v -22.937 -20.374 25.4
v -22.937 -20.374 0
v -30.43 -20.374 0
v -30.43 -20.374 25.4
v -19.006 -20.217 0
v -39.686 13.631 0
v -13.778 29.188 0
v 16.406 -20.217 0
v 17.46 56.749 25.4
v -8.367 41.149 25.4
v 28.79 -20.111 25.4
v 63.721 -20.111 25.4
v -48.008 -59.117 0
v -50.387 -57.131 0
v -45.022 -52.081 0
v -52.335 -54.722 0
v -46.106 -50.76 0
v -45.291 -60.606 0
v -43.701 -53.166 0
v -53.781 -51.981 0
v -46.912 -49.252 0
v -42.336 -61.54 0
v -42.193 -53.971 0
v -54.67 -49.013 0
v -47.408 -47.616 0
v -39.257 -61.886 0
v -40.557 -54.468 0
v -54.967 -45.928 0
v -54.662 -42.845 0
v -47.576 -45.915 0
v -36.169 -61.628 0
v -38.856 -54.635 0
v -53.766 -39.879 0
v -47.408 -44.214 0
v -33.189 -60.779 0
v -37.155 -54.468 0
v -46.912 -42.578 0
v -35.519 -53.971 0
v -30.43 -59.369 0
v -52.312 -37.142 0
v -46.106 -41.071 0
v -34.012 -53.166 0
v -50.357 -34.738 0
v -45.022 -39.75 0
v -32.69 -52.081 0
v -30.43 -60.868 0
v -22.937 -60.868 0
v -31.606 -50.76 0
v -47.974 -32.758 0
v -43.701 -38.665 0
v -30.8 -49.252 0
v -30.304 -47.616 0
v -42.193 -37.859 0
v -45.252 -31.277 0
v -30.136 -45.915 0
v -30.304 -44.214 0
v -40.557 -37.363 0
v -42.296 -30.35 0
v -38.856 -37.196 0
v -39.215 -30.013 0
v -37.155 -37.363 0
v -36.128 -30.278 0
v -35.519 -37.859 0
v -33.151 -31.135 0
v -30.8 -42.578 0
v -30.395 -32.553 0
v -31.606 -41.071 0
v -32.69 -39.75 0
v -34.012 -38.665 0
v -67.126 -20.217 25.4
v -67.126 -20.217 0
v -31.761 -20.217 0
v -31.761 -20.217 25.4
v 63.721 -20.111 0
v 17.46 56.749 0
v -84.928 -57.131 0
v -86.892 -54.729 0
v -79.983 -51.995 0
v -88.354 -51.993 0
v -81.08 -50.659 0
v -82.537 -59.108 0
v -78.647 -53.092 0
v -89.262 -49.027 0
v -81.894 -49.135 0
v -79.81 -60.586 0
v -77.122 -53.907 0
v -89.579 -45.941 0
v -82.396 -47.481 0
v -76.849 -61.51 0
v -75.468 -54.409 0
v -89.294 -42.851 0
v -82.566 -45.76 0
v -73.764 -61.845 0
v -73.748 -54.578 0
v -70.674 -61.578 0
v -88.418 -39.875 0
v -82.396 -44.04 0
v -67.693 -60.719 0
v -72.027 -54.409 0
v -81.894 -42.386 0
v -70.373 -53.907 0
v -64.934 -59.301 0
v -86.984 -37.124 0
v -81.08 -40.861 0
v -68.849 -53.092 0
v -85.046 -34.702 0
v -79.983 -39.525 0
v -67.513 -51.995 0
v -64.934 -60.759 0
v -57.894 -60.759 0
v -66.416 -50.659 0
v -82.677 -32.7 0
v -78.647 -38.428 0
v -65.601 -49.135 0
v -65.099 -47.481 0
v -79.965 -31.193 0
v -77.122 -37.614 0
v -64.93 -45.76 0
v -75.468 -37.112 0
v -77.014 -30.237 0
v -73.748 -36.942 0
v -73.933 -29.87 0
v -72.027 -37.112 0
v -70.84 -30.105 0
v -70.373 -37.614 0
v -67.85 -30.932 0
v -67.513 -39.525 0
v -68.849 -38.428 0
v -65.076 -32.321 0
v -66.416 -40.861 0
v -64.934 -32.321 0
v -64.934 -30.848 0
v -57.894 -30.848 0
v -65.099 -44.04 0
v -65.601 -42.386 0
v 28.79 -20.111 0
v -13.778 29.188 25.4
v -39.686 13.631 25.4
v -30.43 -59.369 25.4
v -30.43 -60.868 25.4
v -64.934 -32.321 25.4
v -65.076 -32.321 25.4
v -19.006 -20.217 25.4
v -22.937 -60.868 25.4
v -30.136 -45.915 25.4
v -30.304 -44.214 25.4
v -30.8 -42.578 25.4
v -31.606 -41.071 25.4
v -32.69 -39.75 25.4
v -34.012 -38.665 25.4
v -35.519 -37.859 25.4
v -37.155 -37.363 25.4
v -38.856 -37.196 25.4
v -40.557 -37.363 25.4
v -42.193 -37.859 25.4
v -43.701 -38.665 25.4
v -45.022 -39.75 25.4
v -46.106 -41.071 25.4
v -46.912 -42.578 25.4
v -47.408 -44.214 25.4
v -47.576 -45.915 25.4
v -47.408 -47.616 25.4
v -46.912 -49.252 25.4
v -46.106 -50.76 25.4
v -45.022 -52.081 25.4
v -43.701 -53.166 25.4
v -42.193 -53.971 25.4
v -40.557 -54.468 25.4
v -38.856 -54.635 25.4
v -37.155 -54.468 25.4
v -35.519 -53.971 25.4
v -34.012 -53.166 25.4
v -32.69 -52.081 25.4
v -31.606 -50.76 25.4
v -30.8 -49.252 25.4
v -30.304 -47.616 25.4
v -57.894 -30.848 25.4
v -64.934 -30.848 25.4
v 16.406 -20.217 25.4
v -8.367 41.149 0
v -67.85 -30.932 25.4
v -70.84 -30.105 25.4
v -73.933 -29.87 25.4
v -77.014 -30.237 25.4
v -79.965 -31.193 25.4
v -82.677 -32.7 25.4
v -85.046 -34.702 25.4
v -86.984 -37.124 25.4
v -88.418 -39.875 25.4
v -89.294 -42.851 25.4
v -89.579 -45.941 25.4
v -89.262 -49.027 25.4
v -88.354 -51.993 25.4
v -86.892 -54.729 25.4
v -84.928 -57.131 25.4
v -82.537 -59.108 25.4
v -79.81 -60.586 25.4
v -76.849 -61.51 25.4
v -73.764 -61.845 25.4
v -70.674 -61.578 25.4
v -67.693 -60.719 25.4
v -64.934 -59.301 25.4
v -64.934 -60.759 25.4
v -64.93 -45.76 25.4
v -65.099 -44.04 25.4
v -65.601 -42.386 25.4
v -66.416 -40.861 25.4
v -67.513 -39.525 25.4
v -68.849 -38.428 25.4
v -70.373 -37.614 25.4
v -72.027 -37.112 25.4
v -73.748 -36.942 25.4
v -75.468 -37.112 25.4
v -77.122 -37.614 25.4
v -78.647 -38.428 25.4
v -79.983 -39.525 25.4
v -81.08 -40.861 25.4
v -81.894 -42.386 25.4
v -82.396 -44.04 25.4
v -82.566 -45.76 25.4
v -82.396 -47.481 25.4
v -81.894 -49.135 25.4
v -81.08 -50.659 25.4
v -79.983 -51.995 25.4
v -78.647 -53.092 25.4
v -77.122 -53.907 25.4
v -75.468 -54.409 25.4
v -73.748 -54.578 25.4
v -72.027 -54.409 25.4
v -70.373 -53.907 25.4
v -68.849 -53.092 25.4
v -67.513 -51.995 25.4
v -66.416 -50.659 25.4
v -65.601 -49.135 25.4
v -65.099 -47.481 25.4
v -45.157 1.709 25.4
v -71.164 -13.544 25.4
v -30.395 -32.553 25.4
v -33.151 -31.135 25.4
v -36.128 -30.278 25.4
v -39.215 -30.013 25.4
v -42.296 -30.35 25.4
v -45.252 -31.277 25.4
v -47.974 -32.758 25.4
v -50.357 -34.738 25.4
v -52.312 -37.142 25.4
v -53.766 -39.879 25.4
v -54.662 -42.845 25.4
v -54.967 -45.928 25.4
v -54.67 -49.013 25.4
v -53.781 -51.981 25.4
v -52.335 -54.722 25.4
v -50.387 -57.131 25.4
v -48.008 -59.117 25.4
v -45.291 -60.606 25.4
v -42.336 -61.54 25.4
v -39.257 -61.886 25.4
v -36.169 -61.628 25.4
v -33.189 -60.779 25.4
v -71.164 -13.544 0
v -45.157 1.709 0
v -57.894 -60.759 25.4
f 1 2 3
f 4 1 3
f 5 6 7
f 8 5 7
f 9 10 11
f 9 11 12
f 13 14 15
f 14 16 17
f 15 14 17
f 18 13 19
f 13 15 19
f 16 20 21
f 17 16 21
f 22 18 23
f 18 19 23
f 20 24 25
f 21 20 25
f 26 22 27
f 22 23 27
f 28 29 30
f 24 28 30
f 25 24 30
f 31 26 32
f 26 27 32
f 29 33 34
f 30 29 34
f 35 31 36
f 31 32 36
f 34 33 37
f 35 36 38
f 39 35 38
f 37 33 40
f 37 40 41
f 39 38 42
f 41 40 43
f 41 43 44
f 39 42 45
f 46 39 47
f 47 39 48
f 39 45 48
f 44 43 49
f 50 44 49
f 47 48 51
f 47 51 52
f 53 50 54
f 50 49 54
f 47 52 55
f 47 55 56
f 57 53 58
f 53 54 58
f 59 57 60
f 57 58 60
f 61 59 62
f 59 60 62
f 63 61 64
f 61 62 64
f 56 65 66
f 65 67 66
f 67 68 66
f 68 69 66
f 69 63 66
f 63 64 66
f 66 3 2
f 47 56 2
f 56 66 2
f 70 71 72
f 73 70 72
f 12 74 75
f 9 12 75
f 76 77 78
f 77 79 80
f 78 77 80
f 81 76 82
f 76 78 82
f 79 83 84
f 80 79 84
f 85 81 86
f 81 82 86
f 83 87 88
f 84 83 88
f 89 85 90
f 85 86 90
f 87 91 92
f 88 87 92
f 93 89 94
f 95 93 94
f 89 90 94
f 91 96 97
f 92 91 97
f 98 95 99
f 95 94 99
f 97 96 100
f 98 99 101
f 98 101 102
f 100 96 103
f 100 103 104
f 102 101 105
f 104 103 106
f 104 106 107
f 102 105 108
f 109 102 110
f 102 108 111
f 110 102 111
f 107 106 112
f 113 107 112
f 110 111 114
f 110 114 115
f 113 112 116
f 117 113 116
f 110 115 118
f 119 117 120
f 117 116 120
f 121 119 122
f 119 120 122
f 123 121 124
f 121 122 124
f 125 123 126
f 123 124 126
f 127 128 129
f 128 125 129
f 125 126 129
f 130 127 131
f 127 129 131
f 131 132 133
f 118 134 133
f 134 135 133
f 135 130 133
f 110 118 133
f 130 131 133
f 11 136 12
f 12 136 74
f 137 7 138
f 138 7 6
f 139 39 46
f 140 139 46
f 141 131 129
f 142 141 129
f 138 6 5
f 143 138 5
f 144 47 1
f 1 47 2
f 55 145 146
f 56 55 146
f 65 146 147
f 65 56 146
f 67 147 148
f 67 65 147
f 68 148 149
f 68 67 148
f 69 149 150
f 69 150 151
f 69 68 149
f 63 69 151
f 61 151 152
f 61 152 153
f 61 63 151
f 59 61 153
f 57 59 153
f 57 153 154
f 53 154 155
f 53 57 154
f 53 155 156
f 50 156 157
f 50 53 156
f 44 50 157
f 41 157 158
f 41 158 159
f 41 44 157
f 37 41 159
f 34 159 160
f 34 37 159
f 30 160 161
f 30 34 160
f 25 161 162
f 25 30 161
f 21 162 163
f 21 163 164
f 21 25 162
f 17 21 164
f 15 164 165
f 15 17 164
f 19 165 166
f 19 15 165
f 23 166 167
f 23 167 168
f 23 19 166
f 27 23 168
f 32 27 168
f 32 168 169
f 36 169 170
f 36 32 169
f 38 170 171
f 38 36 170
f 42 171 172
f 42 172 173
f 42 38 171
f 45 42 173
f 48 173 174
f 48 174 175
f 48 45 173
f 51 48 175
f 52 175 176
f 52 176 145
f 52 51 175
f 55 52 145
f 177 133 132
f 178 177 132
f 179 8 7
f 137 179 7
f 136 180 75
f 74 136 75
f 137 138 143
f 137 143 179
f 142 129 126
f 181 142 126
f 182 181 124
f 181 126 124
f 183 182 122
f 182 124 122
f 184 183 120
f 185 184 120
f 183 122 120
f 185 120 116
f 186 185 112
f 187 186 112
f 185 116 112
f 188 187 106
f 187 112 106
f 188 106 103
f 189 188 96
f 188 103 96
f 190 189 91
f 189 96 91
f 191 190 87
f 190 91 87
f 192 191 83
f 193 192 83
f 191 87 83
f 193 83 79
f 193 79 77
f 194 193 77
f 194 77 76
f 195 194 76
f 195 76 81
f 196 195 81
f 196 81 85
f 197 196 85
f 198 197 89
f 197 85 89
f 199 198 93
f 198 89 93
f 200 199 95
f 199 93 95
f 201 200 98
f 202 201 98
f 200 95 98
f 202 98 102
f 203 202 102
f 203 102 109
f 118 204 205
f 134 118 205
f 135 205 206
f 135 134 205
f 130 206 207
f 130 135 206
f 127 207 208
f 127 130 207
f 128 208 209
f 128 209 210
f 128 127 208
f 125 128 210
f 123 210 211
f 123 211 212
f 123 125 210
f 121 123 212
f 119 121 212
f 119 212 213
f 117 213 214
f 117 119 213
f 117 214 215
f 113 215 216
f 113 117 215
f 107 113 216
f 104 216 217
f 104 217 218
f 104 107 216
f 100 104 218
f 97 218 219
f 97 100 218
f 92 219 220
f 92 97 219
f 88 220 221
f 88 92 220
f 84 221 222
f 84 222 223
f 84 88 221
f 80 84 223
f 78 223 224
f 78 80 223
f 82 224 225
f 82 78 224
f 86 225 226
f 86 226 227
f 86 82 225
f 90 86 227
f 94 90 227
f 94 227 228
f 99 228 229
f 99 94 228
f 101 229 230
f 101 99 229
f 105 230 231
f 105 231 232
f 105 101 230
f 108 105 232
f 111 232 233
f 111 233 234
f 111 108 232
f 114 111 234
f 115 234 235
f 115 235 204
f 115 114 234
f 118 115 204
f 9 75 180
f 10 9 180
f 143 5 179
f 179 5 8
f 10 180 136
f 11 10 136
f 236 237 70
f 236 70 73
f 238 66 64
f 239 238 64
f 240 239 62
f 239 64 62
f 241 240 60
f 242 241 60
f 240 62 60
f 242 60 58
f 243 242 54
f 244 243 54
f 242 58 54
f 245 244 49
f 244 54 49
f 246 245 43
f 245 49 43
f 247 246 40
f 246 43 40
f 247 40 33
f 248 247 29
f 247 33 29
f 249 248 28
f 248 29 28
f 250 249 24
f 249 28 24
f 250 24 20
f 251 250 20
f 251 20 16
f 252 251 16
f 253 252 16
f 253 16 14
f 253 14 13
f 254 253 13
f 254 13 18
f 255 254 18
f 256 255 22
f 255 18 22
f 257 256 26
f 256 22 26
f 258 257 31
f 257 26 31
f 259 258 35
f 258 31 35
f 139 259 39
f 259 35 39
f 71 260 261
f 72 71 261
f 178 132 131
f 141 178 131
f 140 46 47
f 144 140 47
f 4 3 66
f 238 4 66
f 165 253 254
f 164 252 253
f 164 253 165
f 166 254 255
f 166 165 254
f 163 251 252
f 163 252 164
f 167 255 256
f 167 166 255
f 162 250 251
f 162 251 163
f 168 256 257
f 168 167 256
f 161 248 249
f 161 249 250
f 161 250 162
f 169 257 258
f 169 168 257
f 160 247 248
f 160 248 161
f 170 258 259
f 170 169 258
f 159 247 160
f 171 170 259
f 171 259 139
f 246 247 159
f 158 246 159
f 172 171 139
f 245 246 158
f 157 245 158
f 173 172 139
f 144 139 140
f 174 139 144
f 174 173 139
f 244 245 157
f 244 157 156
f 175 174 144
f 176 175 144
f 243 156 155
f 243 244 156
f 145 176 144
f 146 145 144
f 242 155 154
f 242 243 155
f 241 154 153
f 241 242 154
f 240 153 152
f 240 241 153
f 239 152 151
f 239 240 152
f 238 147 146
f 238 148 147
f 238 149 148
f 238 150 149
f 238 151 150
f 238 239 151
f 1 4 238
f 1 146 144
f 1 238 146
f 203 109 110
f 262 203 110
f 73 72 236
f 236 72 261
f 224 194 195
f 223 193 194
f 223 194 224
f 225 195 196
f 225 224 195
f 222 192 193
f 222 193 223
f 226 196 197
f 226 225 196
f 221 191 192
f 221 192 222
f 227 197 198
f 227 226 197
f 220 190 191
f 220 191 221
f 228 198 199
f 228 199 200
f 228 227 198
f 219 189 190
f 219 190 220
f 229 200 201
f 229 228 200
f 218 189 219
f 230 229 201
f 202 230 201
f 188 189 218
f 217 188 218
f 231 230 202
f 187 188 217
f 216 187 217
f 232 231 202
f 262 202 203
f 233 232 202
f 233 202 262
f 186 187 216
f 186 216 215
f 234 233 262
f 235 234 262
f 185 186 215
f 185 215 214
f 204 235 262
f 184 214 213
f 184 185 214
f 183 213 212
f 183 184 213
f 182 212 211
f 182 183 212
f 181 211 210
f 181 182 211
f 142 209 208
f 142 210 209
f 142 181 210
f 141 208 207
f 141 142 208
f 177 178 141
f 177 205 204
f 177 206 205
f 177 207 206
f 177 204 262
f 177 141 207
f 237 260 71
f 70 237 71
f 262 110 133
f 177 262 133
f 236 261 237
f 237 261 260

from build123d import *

# Parameters (mm, degrees)
F0_R     = 8.817879
F0_R_2   = 8.719755
F1_DEPTH = 25.4


with BuildPart() as f1:
    # F0 (on Top) → F1 (new body)
    with BuildSketch(Plane.XY):
        Polygon((63.720725, -20.110851), (17.45989, 56.749374), (-8.36722, 41.1493), (28.789517, -20.110851), align=None)
        Polygon((-31.761169, -20.216875), (-45.156837, 1.709113), (-71.163848, -13.543657), (-67.126483, -20.216875), align=None)
        Polygon((16.406185, -20.216875), (-13.777783, 29.188152), (-39.685947, 13.631486), (-19.006314, -20.216875), align=None)
        with BuildLine():
            Line((-64.933681, -32.321095), (-65.076143, -32.321095))
            ThreePointArc((-65.076143, -32.321095), (-89.578919, -45.94057), (-64.933681, -59.300523))
            Line((-64.933681, -59.300523), (-64.933681, -60.75903))
            Line((-64.933681, -60.75903), (-57.893954, -60.75903))
            Line((-57.893954, -60.75903), (-57.893954, -30.848039))
            Line((-57.893954, -30.848039), (-64.933681, -30.848039))
            Line((-64.933681, -30.848039), (-64.933681, -32.321095))
        make_face()
        with Locations((-73.74775, -45.760293)):
            Circle(F0_R, mode=Mode.SUBTRACT)
        with BuildLine():
            Line((-30.430358, -20.373601), (-30.395195, -32.552712))
            ThreePointArc((-30.395195, -32.552712), (-54.966896, -45.928445), (-30.430358, -59.368573))
            Line((-30.430358, -59.368573), (-30.430358, -60.867589))
            Line((-30.430358, -60.867589), (-22.936562, -60.867589))
            Line((-22.936562, -60.867589), (-22.936562, -20.373601))
            Line((-22.936562, -20.373601), (-30.430358, -20.373601))
        make_face()
        with Locations((-38.856147, -45.915331)):
            Circle(F0_R_2, mode=Mode.SUBTRACT)
    extrude(amount=F1_DEPTH)


solid = f1.part
